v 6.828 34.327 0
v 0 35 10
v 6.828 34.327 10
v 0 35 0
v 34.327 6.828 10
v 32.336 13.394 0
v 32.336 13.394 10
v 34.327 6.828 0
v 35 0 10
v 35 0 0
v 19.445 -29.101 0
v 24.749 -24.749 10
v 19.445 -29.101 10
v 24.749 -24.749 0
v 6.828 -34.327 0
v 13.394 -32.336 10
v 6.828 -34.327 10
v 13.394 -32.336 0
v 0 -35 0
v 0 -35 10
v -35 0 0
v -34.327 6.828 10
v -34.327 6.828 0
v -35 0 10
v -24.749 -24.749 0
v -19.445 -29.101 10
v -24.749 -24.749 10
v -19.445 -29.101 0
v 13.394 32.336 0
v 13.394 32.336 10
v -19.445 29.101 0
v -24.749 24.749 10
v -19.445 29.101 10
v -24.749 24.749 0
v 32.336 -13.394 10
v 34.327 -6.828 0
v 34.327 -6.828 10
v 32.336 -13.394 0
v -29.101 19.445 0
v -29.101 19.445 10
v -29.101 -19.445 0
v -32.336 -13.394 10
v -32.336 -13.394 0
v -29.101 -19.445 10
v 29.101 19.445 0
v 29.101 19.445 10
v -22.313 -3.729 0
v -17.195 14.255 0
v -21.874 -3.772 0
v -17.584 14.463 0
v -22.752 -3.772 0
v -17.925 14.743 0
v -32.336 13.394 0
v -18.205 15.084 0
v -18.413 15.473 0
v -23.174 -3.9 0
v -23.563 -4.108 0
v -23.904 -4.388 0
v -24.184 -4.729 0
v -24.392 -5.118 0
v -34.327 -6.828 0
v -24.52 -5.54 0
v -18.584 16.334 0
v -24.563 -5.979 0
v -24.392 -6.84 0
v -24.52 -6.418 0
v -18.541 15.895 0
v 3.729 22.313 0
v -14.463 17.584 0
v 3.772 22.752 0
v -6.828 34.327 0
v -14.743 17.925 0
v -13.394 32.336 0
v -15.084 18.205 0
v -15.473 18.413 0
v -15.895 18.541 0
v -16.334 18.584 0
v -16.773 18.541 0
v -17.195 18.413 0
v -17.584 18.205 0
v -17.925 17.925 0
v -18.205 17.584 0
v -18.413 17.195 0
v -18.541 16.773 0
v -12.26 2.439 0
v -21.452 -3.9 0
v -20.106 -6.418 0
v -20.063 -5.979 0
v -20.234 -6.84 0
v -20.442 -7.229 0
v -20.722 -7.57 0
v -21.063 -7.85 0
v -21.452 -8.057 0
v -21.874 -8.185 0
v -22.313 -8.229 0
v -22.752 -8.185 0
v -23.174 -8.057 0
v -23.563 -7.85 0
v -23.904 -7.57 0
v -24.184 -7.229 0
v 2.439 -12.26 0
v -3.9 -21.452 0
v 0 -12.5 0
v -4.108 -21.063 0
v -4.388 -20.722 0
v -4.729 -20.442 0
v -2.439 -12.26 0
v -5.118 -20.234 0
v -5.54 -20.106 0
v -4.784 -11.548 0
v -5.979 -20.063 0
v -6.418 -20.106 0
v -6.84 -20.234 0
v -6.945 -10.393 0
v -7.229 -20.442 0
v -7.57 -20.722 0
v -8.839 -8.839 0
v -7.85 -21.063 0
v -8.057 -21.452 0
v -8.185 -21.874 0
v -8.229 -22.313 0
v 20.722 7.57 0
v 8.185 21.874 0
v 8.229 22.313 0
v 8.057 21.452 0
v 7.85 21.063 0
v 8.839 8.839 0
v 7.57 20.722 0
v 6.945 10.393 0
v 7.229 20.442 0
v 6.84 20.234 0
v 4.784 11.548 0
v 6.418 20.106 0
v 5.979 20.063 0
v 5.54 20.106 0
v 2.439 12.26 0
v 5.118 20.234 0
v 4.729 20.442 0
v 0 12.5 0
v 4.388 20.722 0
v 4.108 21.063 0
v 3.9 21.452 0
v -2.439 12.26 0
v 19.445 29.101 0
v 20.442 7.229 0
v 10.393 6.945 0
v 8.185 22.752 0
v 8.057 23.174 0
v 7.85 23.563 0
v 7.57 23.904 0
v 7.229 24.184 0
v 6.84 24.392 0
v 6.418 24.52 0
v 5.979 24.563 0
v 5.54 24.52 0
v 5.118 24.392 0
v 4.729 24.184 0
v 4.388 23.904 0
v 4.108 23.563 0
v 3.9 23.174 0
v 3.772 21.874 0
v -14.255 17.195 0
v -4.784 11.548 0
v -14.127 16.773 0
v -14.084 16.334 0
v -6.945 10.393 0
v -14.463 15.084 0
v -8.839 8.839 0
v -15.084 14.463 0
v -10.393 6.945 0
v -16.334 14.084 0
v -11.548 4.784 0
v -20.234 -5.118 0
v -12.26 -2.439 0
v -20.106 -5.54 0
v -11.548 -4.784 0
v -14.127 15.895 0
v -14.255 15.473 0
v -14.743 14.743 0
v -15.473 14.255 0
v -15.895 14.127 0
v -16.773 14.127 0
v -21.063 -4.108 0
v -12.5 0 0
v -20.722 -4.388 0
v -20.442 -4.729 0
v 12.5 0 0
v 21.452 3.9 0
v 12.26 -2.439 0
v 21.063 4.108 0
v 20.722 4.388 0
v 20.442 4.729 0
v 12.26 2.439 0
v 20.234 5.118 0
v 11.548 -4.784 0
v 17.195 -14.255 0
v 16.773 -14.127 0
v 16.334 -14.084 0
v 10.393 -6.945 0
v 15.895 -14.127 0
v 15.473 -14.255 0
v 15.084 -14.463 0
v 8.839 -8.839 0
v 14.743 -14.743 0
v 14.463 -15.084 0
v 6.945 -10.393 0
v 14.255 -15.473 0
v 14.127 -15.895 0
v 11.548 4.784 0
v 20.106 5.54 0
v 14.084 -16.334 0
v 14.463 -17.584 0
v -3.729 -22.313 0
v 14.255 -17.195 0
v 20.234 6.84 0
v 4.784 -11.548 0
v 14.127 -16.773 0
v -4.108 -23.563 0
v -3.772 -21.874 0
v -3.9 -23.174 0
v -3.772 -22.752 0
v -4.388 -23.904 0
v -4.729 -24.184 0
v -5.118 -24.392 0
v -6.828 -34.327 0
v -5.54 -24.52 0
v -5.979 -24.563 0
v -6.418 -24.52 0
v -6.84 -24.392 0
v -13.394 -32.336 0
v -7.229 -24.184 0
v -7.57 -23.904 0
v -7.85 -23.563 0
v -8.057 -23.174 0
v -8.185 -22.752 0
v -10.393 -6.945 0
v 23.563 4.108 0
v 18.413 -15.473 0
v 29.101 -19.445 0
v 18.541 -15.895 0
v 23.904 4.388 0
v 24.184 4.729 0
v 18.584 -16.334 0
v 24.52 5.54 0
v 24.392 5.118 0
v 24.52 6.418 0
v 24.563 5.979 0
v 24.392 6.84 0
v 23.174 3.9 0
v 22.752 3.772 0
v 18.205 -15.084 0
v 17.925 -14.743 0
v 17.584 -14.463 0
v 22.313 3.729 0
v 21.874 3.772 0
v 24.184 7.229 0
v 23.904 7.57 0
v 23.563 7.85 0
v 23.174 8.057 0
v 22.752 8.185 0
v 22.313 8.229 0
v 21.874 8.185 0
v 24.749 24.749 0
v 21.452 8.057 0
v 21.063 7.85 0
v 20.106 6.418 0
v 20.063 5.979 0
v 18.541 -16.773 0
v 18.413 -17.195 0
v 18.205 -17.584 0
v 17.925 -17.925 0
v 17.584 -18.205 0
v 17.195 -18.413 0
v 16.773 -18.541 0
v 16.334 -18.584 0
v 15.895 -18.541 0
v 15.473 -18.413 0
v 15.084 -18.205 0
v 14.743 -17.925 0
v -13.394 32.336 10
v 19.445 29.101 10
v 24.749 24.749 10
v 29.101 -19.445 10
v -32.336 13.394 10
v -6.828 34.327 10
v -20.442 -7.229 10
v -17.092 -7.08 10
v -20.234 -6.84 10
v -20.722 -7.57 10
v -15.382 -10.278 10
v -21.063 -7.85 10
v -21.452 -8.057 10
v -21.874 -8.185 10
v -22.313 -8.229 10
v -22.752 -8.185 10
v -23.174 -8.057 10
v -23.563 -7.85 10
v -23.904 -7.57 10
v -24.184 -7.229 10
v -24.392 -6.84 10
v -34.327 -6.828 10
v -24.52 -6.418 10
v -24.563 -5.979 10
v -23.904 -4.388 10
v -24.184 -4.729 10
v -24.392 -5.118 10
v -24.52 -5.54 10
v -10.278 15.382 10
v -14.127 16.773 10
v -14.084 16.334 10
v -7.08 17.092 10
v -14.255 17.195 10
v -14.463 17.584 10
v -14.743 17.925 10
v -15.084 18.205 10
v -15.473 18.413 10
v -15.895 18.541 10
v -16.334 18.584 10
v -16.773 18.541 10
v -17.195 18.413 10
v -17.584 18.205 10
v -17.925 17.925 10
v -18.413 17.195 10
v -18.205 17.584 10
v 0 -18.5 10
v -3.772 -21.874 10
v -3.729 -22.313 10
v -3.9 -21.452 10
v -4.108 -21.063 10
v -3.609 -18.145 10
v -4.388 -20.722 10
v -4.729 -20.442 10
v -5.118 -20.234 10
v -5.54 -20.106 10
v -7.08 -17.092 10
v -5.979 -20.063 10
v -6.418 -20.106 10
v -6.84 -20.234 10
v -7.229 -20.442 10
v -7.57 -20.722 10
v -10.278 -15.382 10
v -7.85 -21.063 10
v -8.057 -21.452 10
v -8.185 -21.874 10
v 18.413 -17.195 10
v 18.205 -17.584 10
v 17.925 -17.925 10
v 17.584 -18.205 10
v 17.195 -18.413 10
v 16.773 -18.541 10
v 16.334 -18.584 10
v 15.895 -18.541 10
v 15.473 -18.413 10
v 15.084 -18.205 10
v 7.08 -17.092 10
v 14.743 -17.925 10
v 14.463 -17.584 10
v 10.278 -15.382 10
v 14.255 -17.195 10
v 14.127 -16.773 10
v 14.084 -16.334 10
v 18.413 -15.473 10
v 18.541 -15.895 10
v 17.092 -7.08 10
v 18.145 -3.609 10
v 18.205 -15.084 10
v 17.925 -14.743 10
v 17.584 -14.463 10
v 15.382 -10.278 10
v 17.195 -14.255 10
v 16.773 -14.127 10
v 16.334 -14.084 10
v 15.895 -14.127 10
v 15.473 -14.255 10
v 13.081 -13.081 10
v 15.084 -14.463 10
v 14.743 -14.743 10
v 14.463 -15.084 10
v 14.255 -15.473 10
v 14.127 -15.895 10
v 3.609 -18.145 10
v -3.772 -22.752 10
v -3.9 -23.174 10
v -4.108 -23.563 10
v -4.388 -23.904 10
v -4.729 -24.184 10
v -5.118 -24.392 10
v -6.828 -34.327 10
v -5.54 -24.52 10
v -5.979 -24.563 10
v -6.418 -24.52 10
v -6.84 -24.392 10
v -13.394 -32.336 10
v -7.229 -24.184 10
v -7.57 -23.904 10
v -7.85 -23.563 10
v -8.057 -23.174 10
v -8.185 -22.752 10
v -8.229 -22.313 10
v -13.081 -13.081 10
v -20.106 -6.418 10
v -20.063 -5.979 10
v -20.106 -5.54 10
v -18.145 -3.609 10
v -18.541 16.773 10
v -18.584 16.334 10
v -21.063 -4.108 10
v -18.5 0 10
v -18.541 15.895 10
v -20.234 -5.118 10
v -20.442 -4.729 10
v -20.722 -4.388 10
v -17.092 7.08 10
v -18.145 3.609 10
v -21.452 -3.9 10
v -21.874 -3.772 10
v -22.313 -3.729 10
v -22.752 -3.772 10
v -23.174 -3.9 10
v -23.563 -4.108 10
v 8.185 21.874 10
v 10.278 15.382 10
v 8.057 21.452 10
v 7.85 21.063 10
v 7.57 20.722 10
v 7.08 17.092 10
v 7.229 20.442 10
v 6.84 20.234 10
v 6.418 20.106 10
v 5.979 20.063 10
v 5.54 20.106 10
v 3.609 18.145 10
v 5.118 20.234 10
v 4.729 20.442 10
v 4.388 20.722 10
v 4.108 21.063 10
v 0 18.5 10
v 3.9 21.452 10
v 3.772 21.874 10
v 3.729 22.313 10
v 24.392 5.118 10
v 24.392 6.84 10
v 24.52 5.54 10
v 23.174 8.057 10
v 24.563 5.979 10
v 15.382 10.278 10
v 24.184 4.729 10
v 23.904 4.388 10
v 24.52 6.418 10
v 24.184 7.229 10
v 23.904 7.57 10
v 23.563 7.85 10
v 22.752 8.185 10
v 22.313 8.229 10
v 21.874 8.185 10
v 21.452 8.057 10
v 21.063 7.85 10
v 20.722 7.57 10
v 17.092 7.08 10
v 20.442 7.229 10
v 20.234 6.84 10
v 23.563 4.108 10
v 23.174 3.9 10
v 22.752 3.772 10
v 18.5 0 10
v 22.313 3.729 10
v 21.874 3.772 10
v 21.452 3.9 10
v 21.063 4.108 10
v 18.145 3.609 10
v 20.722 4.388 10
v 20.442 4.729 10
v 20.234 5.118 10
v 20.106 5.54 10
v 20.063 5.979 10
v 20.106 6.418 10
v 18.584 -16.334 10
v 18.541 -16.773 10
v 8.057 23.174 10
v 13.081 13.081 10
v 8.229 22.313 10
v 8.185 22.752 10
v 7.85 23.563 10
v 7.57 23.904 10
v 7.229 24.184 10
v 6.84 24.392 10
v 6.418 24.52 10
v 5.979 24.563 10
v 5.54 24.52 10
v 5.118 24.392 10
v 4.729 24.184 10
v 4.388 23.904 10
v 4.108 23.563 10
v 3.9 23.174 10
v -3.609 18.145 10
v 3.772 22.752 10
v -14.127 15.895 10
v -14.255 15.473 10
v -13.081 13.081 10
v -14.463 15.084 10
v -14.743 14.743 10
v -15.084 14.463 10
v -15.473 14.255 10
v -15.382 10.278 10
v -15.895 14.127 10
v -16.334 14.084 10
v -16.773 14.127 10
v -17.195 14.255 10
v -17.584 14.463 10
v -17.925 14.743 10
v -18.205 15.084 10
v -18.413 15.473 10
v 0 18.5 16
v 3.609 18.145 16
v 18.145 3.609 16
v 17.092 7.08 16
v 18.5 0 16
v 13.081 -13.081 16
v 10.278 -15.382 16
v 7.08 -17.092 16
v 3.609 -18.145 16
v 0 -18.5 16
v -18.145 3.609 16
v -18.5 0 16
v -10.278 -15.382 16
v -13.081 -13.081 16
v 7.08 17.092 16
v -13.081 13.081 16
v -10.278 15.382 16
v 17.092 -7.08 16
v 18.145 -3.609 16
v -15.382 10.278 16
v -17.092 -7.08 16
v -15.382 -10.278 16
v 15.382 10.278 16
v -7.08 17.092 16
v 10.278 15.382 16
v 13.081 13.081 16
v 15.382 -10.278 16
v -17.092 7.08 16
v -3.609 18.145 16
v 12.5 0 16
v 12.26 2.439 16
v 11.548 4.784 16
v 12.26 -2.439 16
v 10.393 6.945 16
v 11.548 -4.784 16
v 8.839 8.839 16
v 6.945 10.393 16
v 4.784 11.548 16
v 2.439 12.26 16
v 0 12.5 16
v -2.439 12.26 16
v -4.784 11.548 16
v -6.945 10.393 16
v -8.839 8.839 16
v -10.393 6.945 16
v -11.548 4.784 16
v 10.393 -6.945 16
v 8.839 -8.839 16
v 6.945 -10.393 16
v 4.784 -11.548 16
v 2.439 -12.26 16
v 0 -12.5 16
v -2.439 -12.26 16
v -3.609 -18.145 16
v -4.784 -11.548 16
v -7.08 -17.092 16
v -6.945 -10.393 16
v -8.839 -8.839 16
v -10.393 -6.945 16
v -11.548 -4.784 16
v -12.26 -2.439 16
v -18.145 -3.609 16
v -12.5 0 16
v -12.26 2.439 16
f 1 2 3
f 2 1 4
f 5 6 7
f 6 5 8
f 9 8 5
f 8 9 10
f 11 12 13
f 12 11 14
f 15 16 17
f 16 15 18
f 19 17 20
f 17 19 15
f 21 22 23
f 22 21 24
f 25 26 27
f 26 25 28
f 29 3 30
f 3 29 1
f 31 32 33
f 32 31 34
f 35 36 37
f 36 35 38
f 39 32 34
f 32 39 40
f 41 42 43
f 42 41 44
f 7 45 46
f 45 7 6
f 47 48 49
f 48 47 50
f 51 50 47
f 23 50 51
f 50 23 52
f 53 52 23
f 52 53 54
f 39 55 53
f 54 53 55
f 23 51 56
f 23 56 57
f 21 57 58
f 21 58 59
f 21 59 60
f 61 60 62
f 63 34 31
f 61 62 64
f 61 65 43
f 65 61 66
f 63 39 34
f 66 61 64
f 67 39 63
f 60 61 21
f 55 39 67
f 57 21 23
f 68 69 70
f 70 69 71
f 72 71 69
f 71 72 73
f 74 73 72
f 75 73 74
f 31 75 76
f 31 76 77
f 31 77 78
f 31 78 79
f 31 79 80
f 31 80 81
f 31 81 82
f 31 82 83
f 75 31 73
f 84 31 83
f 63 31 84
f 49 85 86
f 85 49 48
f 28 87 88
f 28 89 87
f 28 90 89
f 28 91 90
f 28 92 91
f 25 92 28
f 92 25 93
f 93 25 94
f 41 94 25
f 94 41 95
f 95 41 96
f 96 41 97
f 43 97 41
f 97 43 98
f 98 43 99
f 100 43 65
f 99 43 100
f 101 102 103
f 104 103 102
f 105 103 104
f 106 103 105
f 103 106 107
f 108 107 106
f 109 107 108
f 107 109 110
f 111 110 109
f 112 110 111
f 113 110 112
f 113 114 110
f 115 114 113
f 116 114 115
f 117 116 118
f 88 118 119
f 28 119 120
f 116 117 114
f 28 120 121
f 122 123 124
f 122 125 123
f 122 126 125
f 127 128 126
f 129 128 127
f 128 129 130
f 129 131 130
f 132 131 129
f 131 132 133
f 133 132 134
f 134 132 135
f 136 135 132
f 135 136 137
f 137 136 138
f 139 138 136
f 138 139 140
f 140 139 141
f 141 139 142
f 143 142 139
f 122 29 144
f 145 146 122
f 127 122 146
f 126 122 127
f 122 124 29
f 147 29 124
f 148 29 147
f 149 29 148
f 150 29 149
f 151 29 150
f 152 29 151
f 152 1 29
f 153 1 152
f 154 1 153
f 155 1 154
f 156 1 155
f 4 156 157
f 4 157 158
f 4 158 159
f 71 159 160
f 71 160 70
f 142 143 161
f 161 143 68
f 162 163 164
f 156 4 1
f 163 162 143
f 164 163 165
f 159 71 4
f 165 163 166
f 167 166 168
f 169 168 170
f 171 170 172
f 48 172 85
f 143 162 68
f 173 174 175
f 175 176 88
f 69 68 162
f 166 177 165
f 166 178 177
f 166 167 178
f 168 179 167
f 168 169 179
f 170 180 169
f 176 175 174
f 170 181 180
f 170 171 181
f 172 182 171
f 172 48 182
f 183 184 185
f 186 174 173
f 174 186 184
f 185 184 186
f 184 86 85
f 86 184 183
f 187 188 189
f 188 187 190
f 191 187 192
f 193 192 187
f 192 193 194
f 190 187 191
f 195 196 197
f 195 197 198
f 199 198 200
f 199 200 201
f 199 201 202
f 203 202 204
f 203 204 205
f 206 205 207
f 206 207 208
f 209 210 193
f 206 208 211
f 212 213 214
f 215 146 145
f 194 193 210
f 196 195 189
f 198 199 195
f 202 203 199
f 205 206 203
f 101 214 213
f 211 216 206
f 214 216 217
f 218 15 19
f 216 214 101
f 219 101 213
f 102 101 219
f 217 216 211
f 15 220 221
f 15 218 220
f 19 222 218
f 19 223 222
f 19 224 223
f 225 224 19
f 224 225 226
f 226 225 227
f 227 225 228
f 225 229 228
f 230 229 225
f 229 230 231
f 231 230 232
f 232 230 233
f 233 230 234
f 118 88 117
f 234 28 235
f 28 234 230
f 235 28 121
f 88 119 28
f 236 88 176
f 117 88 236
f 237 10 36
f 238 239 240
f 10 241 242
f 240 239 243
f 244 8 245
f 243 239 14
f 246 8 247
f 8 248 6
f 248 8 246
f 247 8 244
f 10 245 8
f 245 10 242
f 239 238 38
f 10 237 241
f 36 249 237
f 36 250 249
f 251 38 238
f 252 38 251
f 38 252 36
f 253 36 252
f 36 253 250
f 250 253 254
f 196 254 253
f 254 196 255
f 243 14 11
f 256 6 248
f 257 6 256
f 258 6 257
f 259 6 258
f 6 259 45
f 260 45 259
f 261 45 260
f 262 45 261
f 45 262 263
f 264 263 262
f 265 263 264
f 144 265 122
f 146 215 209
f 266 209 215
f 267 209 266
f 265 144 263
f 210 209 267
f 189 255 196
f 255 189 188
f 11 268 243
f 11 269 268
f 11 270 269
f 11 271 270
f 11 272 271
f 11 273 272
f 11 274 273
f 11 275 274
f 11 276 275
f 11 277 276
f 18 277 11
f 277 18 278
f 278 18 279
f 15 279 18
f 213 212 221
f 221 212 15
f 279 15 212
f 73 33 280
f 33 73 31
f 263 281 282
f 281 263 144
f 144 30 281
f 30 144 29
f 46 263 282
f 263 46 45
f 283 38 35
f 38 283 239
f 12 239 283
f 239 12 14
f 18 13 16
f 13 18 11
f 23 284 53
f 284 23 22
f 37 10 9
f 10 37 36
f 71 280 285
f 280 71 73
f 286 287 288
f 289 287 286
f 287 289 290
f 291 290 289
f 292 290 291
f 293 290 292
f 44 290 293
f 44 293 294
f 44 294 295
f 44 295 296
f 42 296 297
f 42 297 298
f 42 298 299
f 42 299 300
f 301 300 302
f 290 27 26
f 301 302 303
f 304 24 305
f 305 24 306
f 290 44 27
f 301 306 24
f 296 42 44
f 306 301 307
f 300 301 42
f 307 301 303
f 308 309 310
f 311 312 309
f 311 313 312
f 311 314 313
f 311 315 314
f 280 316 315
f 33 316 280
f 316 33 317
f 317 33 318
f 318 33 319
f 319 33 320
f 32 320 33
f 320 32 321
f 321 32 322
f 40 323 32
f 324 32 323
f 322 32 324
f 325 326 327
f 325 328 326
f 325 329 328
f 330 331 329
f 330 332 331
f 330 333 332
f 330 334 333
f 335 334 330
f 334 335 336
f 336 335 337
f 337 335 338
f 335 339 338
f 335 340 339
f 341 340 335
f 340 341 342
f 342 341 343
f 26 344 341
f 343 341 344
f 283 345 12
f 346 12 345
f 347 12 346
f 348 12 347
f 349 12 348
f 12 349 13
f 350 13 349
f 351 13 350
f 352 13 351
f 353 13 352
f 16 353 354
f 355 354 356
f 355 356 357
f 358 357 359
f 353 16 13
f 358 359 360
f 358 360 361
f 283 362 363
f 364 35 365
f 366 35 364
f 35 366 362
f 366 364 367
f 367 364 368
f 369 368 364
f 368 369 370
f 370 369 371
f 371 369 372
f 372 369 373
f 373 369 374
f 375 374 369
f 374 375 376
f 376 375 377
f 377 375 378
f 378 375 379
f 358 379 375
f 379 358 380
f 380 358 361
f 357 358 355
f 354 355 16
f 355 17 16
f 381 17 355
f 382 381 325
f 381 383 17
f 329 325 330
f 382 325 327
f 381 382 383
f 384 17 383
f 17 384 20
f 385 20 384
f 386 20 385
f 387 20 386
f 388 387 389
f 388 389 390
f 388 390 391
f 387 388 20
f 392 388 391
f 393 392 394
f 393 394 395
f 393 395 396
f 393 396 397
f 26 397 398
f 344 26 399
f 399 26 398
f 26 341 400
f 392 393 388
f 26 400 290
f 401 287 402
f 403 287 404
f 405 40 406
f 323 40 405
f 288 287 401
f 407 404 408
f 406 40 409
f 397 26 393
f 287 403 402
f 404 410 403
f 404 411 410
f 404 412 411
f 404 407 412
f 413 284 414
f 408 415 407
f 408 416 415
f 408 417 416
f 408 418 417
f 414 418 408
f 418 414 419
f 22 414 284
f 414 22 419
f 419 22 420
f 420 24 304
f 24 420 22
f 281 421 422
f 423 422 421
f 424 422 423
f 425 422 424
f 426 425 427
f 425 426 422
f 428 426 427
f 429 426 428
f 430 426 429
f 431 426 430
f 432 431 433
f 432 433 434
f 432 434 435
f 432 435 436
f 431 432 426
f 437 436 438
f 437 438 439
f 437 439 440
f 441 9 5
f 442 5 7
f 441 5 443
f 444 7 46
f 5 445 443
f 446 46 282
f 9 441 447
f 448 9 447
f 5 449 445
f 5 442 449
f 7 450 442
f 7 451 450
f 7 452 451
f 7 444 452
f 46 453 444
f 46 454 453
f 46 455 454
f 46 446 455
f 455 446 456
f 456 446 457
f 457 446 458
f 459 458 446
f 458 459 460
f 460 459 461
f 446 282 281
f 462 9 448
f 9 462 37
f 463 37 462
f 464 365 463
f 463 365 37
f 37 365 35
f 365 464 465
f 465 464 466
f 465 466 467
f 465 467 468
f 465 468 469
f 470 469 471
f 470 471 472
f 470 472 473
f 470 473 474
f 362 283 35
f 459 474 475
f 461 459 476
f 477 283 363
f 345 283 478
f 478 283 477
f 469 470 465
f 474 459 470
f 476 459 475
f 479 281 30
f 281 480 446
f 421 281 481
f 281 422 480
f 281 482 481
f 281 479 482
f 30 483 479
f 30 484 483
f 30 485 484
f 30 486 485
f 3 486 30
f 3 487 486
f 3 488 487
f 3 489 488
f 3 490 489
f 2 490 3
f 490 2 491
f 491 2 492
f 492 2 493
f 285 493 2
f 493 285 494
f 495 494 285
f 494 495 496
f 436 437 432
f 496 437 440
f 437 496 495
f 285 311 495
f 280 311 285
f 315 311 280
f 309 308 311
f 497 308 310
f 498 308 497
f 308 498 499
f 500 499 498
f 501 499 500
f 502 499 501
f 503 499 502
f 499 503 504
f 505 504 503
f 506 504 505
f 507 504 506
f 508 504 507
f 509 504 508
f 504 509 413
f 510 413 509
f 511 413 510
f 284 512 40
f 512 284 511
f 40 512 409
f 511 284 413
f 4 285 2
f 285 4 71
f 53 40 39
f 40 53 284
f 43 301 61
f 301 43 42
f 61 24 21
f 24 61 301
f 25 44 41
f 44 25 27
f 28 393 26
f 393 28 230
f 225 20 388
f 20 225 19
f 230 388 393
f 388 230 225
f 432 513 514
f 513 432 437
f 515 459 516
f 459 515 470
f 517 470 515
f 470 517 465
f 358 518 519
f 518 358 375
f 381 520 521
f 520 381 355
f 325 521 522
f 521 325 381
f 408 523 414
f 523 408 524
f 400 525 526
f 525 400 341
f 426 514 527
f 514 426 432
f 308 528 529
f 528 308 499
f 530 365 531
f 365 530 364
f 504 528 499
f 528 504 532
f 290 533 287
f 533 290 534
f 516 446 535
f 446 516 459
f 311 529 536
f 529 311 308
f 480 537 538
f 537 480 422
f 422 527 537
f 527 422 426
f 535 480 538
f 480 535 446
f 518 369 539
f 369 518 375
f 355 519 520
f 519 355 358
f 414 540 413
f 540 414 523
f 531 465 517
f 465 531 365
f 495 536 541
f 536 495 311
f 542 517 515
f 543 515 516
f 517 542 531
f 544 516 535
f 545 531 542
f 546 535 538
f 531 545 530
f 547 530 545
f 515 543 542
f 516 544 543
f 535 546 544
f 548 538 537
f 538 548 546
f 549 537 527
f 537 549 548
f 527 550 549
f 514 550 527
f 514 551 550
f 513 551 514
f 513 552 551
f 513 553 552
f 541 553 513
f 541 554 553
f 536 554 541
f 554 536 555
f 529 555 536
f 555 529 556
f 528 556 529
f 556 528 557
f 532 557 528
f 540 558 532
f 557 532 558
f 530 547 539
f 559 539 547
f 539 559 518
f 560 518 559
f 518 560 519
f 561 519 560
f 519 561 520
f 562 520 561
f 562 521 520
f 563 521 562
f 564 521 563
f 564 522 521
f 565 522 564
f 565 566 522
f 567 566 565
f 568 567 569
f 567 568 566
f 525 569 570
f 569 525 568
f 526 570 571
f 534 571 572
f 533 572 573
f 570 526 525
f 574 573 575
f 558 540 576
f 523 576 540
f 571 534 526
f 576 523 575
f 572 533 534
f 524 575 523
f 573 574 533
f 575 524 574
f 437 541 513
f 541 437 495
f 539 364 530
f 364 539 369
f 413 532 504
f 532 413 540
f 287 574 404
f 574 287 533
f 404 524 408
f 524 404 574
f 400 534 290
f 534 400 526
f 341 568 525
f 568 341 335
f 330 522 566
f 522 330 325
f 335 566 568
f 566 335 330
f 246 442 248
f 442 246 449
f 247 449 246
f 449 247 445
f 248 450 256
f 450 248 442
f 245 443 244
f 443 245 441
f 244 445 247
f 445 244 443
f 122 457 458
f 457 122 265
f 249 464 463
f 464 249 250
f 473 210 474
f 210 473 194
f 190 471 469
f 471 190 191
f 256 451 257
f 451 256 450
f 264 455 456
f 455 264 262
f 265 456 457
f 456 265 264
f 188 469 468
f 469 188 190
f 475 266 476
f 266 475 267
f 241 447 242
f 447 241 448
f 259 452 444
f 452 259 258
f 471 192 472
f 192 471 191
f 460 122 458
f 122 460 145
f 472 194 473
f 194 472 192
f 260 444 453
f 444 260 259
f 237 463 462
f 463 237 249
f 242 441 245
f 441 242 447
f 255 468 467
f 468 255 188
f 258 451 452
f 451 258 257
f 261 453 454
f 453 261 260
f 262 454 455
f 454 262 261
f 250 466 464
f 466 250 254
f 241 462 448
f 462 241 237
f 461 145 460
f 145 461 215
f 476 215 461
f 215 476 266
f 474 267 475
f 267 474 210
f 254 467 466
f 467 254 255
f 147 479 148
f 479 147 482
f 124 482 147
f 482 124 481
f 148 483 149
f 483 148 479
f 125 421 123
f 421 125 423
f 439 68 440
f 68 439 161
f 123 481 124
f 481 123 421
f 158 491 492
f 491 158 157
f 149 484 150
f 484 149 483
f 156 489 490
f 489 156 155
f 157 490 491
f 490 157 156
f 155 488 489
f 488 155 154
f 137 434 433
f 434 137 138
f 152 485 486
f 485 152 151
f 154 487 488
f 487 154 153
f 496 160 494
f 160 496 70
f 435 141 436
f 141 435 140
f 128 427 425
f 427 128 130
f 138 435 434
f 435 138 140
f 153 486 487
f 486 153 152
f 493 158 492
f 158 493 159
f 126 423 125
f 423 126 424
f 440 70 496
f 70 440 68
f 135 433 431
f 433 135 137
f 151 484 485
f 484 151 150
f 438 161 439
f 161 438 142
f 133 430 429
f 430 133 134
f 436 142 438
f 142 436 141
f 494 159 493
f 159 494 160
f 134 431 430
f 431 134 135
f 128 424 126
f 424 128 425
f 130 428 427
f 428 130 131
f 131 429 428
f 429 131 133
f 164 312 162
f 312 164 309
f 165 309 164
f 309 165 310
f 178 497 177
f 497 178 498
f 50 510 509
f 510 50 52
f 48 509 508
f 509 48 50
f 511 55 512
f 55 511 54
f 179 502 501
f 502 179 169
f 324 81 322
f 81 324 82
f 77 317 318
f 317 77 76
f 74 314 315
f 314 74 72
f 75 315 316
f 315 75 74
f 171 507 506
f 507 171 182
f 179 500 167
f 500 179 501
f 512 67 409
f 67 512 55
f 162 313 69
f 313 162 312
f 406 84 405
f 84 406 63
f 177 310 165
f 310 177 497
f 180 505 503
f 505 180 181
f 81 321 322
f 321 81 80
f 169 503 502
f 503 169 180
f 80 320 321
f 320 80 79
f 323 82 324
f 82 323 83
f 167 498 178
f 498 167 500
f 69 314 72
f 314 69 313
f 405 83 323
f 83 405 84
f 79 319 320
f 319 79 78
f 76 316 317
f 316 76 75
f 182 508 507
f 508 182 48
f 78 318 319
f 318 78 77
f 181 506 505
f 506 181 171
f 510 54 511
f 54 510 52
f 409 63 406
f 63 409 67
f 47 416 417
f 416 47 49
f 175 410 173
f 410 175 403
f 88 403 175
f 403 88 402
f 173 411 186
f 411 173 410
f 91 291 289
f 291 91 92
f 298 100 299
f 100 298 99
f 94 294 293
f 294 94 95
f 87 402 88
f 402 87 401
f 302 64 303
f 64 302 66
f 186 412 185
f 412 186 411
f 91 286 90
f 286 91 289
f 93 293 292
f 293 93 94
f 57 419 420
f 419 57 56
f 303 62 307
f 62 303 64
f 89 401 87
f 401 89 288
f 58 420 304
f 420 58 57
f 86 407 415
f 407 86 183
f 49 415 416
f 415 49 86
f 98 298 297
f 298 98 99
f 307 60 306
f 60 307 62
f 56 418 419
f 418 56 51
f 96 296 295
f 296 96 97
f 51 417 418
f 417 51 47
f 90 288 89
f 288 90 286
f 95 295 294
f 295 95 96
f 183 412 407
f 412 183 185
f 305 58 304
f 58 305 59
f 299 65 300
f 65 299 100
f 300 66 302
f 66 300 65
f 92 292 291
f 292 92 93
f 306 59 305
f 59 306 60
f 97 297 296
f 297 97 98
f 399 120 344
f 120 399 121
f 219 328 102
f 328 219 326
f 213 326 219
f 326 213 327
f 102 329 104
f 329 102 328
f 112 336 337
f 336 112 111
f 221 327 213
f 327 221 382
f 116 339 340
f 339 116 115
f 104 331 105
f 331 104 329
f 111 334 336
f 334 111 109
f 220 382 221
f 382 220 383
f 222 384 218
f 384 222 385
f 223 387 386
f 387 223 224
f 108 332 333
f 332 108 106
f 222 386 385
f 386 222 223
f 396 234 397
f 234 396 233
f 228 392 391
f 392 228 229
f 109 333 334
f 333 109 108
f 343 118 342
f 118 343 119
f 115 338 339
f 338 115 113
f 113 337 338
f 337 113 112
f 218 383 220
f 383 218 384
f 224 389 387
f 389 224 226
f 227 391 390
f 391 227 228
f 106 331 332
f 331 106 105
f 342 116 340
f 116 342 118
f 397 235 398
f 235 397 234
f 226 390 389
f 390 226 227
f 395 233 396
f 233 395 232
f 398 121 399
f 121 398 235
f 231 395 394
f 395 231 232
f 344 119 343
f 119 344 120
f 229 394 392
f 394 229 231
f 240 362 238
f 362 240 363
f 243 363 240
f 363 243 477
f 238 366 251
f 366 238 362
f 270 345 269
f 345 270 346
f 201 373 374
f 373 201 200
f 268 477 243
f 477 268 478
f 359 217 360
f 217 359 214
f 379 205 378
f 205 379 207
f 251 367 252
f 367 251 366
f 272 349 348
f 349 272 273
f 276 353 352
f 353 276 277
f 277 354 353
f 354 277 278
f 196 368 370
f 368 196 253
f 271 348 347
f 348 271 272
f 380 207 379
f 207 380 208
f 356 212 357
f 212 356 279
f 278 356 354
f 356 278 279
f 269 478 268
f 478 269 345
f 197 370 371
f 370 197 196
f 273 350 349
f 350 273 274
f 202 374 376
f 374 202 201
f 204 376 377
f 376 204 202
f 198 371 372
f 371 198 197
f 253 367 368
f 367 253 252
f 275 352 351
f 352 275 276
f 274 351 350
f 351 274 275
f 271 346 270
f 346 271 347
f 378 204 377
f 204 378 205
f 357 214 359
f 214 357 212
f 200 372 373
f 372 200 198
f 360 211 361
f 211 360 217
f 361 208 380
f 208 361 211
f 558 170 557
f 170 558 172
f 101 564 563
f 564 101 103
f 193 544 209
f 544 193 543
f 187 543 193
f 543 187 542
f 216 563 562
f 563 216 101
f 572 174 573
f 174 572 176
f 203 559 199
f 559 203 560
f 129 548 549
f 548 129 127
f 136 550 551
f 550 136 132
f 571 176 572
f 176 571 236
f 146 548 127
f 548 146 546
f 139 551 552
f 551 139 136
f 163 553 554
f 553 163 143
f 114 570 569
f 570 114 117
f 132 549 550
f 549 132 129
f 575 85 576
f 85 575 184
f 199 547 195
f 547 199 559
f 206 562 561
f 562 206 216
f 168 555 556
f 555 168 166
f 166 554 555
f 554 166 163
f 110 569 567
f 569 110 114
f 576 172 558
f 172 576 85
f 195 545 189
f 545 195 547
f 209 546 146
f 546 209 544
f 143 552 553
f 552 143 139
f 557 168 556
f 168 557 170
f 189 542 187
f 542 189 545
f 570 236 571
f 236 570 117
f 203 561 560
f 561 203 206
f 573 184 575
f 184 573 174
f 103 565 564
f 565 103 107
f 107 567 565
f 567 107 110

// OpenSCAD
$fn = 32;

// ----------------------------------------------------------------------
// Flange Ø70 x 10
// 6 holes on a Ø46.2 bolt circle, bolted joints
// ----------------------------------------------------------------------

// --- parameters (mm) ---
flange_d = 70;   // outside diameter of the flange
thickness = 10;  // flange thickness
holes = 6;       // number of bolt holes
pcd = 46.2;      // bolt circle diameter
start_deg = 15;  // angle of the first hole, from +X
hole_d = 4.5;    // bolt hole diameter
bore_d = 25;     // central through bore
hub_d = 37;      // hub outside diameter
hub_h = 6;       // hub height above the flange face (0 = no hub)

// --- derived feature positions (mm) ---
height = thickness + hub_h;  // = 16   overall height of the part
pcd_r = pcd / 2;             // = 23.1   bolt circle radius
hole_step = 360 / holes;     // = 60   angular pitch
feature_centers = [
  [pcd_r * cos(start_deg + 0 * hole_step), pcd_r * sin(start_deg + 0 * hole_step)],
  [pcd_r * cos(start_deg + 1 * hole_step), pcd_r * sin(start_deg + 1 * hole_step)],
  [pcd_r * cos(start_deg + 2 * hole_step), pcd_r * sin(start_deg + 2 * hole_step)],
  [pcd_r * cos(start_deg + 3 * hole_step), pcd_r * sin(start_deg + 3 * hole_step)],
  [pcd_r * cos(start_deg + 4 * hole_step), pcd_r * sin(start_deg + 4 * hole_step)],
  [pcd_r * cos(start_deg + 5 * hole_step), pcd_r * sin(start_deg + 5 * hole_step)]
];   // bolt hole centres on the pitch circle

// flange disc, every hole and the bore cut straight through
difference() {
  union() {
    cylinder(d = flange_d, h = thickness);
    cylinder(d = hub_d, h = height);  // hub, overlapped into the flange
  }
  translate([0, 0, -1]) cylinder(d = bore_d, h = height + 2);  // bore, through
  for (centre = feature_centers)
    translate([centre[0], centre[1], -1]) cylinder(d = hole_d, h = thickness + 2);
}
